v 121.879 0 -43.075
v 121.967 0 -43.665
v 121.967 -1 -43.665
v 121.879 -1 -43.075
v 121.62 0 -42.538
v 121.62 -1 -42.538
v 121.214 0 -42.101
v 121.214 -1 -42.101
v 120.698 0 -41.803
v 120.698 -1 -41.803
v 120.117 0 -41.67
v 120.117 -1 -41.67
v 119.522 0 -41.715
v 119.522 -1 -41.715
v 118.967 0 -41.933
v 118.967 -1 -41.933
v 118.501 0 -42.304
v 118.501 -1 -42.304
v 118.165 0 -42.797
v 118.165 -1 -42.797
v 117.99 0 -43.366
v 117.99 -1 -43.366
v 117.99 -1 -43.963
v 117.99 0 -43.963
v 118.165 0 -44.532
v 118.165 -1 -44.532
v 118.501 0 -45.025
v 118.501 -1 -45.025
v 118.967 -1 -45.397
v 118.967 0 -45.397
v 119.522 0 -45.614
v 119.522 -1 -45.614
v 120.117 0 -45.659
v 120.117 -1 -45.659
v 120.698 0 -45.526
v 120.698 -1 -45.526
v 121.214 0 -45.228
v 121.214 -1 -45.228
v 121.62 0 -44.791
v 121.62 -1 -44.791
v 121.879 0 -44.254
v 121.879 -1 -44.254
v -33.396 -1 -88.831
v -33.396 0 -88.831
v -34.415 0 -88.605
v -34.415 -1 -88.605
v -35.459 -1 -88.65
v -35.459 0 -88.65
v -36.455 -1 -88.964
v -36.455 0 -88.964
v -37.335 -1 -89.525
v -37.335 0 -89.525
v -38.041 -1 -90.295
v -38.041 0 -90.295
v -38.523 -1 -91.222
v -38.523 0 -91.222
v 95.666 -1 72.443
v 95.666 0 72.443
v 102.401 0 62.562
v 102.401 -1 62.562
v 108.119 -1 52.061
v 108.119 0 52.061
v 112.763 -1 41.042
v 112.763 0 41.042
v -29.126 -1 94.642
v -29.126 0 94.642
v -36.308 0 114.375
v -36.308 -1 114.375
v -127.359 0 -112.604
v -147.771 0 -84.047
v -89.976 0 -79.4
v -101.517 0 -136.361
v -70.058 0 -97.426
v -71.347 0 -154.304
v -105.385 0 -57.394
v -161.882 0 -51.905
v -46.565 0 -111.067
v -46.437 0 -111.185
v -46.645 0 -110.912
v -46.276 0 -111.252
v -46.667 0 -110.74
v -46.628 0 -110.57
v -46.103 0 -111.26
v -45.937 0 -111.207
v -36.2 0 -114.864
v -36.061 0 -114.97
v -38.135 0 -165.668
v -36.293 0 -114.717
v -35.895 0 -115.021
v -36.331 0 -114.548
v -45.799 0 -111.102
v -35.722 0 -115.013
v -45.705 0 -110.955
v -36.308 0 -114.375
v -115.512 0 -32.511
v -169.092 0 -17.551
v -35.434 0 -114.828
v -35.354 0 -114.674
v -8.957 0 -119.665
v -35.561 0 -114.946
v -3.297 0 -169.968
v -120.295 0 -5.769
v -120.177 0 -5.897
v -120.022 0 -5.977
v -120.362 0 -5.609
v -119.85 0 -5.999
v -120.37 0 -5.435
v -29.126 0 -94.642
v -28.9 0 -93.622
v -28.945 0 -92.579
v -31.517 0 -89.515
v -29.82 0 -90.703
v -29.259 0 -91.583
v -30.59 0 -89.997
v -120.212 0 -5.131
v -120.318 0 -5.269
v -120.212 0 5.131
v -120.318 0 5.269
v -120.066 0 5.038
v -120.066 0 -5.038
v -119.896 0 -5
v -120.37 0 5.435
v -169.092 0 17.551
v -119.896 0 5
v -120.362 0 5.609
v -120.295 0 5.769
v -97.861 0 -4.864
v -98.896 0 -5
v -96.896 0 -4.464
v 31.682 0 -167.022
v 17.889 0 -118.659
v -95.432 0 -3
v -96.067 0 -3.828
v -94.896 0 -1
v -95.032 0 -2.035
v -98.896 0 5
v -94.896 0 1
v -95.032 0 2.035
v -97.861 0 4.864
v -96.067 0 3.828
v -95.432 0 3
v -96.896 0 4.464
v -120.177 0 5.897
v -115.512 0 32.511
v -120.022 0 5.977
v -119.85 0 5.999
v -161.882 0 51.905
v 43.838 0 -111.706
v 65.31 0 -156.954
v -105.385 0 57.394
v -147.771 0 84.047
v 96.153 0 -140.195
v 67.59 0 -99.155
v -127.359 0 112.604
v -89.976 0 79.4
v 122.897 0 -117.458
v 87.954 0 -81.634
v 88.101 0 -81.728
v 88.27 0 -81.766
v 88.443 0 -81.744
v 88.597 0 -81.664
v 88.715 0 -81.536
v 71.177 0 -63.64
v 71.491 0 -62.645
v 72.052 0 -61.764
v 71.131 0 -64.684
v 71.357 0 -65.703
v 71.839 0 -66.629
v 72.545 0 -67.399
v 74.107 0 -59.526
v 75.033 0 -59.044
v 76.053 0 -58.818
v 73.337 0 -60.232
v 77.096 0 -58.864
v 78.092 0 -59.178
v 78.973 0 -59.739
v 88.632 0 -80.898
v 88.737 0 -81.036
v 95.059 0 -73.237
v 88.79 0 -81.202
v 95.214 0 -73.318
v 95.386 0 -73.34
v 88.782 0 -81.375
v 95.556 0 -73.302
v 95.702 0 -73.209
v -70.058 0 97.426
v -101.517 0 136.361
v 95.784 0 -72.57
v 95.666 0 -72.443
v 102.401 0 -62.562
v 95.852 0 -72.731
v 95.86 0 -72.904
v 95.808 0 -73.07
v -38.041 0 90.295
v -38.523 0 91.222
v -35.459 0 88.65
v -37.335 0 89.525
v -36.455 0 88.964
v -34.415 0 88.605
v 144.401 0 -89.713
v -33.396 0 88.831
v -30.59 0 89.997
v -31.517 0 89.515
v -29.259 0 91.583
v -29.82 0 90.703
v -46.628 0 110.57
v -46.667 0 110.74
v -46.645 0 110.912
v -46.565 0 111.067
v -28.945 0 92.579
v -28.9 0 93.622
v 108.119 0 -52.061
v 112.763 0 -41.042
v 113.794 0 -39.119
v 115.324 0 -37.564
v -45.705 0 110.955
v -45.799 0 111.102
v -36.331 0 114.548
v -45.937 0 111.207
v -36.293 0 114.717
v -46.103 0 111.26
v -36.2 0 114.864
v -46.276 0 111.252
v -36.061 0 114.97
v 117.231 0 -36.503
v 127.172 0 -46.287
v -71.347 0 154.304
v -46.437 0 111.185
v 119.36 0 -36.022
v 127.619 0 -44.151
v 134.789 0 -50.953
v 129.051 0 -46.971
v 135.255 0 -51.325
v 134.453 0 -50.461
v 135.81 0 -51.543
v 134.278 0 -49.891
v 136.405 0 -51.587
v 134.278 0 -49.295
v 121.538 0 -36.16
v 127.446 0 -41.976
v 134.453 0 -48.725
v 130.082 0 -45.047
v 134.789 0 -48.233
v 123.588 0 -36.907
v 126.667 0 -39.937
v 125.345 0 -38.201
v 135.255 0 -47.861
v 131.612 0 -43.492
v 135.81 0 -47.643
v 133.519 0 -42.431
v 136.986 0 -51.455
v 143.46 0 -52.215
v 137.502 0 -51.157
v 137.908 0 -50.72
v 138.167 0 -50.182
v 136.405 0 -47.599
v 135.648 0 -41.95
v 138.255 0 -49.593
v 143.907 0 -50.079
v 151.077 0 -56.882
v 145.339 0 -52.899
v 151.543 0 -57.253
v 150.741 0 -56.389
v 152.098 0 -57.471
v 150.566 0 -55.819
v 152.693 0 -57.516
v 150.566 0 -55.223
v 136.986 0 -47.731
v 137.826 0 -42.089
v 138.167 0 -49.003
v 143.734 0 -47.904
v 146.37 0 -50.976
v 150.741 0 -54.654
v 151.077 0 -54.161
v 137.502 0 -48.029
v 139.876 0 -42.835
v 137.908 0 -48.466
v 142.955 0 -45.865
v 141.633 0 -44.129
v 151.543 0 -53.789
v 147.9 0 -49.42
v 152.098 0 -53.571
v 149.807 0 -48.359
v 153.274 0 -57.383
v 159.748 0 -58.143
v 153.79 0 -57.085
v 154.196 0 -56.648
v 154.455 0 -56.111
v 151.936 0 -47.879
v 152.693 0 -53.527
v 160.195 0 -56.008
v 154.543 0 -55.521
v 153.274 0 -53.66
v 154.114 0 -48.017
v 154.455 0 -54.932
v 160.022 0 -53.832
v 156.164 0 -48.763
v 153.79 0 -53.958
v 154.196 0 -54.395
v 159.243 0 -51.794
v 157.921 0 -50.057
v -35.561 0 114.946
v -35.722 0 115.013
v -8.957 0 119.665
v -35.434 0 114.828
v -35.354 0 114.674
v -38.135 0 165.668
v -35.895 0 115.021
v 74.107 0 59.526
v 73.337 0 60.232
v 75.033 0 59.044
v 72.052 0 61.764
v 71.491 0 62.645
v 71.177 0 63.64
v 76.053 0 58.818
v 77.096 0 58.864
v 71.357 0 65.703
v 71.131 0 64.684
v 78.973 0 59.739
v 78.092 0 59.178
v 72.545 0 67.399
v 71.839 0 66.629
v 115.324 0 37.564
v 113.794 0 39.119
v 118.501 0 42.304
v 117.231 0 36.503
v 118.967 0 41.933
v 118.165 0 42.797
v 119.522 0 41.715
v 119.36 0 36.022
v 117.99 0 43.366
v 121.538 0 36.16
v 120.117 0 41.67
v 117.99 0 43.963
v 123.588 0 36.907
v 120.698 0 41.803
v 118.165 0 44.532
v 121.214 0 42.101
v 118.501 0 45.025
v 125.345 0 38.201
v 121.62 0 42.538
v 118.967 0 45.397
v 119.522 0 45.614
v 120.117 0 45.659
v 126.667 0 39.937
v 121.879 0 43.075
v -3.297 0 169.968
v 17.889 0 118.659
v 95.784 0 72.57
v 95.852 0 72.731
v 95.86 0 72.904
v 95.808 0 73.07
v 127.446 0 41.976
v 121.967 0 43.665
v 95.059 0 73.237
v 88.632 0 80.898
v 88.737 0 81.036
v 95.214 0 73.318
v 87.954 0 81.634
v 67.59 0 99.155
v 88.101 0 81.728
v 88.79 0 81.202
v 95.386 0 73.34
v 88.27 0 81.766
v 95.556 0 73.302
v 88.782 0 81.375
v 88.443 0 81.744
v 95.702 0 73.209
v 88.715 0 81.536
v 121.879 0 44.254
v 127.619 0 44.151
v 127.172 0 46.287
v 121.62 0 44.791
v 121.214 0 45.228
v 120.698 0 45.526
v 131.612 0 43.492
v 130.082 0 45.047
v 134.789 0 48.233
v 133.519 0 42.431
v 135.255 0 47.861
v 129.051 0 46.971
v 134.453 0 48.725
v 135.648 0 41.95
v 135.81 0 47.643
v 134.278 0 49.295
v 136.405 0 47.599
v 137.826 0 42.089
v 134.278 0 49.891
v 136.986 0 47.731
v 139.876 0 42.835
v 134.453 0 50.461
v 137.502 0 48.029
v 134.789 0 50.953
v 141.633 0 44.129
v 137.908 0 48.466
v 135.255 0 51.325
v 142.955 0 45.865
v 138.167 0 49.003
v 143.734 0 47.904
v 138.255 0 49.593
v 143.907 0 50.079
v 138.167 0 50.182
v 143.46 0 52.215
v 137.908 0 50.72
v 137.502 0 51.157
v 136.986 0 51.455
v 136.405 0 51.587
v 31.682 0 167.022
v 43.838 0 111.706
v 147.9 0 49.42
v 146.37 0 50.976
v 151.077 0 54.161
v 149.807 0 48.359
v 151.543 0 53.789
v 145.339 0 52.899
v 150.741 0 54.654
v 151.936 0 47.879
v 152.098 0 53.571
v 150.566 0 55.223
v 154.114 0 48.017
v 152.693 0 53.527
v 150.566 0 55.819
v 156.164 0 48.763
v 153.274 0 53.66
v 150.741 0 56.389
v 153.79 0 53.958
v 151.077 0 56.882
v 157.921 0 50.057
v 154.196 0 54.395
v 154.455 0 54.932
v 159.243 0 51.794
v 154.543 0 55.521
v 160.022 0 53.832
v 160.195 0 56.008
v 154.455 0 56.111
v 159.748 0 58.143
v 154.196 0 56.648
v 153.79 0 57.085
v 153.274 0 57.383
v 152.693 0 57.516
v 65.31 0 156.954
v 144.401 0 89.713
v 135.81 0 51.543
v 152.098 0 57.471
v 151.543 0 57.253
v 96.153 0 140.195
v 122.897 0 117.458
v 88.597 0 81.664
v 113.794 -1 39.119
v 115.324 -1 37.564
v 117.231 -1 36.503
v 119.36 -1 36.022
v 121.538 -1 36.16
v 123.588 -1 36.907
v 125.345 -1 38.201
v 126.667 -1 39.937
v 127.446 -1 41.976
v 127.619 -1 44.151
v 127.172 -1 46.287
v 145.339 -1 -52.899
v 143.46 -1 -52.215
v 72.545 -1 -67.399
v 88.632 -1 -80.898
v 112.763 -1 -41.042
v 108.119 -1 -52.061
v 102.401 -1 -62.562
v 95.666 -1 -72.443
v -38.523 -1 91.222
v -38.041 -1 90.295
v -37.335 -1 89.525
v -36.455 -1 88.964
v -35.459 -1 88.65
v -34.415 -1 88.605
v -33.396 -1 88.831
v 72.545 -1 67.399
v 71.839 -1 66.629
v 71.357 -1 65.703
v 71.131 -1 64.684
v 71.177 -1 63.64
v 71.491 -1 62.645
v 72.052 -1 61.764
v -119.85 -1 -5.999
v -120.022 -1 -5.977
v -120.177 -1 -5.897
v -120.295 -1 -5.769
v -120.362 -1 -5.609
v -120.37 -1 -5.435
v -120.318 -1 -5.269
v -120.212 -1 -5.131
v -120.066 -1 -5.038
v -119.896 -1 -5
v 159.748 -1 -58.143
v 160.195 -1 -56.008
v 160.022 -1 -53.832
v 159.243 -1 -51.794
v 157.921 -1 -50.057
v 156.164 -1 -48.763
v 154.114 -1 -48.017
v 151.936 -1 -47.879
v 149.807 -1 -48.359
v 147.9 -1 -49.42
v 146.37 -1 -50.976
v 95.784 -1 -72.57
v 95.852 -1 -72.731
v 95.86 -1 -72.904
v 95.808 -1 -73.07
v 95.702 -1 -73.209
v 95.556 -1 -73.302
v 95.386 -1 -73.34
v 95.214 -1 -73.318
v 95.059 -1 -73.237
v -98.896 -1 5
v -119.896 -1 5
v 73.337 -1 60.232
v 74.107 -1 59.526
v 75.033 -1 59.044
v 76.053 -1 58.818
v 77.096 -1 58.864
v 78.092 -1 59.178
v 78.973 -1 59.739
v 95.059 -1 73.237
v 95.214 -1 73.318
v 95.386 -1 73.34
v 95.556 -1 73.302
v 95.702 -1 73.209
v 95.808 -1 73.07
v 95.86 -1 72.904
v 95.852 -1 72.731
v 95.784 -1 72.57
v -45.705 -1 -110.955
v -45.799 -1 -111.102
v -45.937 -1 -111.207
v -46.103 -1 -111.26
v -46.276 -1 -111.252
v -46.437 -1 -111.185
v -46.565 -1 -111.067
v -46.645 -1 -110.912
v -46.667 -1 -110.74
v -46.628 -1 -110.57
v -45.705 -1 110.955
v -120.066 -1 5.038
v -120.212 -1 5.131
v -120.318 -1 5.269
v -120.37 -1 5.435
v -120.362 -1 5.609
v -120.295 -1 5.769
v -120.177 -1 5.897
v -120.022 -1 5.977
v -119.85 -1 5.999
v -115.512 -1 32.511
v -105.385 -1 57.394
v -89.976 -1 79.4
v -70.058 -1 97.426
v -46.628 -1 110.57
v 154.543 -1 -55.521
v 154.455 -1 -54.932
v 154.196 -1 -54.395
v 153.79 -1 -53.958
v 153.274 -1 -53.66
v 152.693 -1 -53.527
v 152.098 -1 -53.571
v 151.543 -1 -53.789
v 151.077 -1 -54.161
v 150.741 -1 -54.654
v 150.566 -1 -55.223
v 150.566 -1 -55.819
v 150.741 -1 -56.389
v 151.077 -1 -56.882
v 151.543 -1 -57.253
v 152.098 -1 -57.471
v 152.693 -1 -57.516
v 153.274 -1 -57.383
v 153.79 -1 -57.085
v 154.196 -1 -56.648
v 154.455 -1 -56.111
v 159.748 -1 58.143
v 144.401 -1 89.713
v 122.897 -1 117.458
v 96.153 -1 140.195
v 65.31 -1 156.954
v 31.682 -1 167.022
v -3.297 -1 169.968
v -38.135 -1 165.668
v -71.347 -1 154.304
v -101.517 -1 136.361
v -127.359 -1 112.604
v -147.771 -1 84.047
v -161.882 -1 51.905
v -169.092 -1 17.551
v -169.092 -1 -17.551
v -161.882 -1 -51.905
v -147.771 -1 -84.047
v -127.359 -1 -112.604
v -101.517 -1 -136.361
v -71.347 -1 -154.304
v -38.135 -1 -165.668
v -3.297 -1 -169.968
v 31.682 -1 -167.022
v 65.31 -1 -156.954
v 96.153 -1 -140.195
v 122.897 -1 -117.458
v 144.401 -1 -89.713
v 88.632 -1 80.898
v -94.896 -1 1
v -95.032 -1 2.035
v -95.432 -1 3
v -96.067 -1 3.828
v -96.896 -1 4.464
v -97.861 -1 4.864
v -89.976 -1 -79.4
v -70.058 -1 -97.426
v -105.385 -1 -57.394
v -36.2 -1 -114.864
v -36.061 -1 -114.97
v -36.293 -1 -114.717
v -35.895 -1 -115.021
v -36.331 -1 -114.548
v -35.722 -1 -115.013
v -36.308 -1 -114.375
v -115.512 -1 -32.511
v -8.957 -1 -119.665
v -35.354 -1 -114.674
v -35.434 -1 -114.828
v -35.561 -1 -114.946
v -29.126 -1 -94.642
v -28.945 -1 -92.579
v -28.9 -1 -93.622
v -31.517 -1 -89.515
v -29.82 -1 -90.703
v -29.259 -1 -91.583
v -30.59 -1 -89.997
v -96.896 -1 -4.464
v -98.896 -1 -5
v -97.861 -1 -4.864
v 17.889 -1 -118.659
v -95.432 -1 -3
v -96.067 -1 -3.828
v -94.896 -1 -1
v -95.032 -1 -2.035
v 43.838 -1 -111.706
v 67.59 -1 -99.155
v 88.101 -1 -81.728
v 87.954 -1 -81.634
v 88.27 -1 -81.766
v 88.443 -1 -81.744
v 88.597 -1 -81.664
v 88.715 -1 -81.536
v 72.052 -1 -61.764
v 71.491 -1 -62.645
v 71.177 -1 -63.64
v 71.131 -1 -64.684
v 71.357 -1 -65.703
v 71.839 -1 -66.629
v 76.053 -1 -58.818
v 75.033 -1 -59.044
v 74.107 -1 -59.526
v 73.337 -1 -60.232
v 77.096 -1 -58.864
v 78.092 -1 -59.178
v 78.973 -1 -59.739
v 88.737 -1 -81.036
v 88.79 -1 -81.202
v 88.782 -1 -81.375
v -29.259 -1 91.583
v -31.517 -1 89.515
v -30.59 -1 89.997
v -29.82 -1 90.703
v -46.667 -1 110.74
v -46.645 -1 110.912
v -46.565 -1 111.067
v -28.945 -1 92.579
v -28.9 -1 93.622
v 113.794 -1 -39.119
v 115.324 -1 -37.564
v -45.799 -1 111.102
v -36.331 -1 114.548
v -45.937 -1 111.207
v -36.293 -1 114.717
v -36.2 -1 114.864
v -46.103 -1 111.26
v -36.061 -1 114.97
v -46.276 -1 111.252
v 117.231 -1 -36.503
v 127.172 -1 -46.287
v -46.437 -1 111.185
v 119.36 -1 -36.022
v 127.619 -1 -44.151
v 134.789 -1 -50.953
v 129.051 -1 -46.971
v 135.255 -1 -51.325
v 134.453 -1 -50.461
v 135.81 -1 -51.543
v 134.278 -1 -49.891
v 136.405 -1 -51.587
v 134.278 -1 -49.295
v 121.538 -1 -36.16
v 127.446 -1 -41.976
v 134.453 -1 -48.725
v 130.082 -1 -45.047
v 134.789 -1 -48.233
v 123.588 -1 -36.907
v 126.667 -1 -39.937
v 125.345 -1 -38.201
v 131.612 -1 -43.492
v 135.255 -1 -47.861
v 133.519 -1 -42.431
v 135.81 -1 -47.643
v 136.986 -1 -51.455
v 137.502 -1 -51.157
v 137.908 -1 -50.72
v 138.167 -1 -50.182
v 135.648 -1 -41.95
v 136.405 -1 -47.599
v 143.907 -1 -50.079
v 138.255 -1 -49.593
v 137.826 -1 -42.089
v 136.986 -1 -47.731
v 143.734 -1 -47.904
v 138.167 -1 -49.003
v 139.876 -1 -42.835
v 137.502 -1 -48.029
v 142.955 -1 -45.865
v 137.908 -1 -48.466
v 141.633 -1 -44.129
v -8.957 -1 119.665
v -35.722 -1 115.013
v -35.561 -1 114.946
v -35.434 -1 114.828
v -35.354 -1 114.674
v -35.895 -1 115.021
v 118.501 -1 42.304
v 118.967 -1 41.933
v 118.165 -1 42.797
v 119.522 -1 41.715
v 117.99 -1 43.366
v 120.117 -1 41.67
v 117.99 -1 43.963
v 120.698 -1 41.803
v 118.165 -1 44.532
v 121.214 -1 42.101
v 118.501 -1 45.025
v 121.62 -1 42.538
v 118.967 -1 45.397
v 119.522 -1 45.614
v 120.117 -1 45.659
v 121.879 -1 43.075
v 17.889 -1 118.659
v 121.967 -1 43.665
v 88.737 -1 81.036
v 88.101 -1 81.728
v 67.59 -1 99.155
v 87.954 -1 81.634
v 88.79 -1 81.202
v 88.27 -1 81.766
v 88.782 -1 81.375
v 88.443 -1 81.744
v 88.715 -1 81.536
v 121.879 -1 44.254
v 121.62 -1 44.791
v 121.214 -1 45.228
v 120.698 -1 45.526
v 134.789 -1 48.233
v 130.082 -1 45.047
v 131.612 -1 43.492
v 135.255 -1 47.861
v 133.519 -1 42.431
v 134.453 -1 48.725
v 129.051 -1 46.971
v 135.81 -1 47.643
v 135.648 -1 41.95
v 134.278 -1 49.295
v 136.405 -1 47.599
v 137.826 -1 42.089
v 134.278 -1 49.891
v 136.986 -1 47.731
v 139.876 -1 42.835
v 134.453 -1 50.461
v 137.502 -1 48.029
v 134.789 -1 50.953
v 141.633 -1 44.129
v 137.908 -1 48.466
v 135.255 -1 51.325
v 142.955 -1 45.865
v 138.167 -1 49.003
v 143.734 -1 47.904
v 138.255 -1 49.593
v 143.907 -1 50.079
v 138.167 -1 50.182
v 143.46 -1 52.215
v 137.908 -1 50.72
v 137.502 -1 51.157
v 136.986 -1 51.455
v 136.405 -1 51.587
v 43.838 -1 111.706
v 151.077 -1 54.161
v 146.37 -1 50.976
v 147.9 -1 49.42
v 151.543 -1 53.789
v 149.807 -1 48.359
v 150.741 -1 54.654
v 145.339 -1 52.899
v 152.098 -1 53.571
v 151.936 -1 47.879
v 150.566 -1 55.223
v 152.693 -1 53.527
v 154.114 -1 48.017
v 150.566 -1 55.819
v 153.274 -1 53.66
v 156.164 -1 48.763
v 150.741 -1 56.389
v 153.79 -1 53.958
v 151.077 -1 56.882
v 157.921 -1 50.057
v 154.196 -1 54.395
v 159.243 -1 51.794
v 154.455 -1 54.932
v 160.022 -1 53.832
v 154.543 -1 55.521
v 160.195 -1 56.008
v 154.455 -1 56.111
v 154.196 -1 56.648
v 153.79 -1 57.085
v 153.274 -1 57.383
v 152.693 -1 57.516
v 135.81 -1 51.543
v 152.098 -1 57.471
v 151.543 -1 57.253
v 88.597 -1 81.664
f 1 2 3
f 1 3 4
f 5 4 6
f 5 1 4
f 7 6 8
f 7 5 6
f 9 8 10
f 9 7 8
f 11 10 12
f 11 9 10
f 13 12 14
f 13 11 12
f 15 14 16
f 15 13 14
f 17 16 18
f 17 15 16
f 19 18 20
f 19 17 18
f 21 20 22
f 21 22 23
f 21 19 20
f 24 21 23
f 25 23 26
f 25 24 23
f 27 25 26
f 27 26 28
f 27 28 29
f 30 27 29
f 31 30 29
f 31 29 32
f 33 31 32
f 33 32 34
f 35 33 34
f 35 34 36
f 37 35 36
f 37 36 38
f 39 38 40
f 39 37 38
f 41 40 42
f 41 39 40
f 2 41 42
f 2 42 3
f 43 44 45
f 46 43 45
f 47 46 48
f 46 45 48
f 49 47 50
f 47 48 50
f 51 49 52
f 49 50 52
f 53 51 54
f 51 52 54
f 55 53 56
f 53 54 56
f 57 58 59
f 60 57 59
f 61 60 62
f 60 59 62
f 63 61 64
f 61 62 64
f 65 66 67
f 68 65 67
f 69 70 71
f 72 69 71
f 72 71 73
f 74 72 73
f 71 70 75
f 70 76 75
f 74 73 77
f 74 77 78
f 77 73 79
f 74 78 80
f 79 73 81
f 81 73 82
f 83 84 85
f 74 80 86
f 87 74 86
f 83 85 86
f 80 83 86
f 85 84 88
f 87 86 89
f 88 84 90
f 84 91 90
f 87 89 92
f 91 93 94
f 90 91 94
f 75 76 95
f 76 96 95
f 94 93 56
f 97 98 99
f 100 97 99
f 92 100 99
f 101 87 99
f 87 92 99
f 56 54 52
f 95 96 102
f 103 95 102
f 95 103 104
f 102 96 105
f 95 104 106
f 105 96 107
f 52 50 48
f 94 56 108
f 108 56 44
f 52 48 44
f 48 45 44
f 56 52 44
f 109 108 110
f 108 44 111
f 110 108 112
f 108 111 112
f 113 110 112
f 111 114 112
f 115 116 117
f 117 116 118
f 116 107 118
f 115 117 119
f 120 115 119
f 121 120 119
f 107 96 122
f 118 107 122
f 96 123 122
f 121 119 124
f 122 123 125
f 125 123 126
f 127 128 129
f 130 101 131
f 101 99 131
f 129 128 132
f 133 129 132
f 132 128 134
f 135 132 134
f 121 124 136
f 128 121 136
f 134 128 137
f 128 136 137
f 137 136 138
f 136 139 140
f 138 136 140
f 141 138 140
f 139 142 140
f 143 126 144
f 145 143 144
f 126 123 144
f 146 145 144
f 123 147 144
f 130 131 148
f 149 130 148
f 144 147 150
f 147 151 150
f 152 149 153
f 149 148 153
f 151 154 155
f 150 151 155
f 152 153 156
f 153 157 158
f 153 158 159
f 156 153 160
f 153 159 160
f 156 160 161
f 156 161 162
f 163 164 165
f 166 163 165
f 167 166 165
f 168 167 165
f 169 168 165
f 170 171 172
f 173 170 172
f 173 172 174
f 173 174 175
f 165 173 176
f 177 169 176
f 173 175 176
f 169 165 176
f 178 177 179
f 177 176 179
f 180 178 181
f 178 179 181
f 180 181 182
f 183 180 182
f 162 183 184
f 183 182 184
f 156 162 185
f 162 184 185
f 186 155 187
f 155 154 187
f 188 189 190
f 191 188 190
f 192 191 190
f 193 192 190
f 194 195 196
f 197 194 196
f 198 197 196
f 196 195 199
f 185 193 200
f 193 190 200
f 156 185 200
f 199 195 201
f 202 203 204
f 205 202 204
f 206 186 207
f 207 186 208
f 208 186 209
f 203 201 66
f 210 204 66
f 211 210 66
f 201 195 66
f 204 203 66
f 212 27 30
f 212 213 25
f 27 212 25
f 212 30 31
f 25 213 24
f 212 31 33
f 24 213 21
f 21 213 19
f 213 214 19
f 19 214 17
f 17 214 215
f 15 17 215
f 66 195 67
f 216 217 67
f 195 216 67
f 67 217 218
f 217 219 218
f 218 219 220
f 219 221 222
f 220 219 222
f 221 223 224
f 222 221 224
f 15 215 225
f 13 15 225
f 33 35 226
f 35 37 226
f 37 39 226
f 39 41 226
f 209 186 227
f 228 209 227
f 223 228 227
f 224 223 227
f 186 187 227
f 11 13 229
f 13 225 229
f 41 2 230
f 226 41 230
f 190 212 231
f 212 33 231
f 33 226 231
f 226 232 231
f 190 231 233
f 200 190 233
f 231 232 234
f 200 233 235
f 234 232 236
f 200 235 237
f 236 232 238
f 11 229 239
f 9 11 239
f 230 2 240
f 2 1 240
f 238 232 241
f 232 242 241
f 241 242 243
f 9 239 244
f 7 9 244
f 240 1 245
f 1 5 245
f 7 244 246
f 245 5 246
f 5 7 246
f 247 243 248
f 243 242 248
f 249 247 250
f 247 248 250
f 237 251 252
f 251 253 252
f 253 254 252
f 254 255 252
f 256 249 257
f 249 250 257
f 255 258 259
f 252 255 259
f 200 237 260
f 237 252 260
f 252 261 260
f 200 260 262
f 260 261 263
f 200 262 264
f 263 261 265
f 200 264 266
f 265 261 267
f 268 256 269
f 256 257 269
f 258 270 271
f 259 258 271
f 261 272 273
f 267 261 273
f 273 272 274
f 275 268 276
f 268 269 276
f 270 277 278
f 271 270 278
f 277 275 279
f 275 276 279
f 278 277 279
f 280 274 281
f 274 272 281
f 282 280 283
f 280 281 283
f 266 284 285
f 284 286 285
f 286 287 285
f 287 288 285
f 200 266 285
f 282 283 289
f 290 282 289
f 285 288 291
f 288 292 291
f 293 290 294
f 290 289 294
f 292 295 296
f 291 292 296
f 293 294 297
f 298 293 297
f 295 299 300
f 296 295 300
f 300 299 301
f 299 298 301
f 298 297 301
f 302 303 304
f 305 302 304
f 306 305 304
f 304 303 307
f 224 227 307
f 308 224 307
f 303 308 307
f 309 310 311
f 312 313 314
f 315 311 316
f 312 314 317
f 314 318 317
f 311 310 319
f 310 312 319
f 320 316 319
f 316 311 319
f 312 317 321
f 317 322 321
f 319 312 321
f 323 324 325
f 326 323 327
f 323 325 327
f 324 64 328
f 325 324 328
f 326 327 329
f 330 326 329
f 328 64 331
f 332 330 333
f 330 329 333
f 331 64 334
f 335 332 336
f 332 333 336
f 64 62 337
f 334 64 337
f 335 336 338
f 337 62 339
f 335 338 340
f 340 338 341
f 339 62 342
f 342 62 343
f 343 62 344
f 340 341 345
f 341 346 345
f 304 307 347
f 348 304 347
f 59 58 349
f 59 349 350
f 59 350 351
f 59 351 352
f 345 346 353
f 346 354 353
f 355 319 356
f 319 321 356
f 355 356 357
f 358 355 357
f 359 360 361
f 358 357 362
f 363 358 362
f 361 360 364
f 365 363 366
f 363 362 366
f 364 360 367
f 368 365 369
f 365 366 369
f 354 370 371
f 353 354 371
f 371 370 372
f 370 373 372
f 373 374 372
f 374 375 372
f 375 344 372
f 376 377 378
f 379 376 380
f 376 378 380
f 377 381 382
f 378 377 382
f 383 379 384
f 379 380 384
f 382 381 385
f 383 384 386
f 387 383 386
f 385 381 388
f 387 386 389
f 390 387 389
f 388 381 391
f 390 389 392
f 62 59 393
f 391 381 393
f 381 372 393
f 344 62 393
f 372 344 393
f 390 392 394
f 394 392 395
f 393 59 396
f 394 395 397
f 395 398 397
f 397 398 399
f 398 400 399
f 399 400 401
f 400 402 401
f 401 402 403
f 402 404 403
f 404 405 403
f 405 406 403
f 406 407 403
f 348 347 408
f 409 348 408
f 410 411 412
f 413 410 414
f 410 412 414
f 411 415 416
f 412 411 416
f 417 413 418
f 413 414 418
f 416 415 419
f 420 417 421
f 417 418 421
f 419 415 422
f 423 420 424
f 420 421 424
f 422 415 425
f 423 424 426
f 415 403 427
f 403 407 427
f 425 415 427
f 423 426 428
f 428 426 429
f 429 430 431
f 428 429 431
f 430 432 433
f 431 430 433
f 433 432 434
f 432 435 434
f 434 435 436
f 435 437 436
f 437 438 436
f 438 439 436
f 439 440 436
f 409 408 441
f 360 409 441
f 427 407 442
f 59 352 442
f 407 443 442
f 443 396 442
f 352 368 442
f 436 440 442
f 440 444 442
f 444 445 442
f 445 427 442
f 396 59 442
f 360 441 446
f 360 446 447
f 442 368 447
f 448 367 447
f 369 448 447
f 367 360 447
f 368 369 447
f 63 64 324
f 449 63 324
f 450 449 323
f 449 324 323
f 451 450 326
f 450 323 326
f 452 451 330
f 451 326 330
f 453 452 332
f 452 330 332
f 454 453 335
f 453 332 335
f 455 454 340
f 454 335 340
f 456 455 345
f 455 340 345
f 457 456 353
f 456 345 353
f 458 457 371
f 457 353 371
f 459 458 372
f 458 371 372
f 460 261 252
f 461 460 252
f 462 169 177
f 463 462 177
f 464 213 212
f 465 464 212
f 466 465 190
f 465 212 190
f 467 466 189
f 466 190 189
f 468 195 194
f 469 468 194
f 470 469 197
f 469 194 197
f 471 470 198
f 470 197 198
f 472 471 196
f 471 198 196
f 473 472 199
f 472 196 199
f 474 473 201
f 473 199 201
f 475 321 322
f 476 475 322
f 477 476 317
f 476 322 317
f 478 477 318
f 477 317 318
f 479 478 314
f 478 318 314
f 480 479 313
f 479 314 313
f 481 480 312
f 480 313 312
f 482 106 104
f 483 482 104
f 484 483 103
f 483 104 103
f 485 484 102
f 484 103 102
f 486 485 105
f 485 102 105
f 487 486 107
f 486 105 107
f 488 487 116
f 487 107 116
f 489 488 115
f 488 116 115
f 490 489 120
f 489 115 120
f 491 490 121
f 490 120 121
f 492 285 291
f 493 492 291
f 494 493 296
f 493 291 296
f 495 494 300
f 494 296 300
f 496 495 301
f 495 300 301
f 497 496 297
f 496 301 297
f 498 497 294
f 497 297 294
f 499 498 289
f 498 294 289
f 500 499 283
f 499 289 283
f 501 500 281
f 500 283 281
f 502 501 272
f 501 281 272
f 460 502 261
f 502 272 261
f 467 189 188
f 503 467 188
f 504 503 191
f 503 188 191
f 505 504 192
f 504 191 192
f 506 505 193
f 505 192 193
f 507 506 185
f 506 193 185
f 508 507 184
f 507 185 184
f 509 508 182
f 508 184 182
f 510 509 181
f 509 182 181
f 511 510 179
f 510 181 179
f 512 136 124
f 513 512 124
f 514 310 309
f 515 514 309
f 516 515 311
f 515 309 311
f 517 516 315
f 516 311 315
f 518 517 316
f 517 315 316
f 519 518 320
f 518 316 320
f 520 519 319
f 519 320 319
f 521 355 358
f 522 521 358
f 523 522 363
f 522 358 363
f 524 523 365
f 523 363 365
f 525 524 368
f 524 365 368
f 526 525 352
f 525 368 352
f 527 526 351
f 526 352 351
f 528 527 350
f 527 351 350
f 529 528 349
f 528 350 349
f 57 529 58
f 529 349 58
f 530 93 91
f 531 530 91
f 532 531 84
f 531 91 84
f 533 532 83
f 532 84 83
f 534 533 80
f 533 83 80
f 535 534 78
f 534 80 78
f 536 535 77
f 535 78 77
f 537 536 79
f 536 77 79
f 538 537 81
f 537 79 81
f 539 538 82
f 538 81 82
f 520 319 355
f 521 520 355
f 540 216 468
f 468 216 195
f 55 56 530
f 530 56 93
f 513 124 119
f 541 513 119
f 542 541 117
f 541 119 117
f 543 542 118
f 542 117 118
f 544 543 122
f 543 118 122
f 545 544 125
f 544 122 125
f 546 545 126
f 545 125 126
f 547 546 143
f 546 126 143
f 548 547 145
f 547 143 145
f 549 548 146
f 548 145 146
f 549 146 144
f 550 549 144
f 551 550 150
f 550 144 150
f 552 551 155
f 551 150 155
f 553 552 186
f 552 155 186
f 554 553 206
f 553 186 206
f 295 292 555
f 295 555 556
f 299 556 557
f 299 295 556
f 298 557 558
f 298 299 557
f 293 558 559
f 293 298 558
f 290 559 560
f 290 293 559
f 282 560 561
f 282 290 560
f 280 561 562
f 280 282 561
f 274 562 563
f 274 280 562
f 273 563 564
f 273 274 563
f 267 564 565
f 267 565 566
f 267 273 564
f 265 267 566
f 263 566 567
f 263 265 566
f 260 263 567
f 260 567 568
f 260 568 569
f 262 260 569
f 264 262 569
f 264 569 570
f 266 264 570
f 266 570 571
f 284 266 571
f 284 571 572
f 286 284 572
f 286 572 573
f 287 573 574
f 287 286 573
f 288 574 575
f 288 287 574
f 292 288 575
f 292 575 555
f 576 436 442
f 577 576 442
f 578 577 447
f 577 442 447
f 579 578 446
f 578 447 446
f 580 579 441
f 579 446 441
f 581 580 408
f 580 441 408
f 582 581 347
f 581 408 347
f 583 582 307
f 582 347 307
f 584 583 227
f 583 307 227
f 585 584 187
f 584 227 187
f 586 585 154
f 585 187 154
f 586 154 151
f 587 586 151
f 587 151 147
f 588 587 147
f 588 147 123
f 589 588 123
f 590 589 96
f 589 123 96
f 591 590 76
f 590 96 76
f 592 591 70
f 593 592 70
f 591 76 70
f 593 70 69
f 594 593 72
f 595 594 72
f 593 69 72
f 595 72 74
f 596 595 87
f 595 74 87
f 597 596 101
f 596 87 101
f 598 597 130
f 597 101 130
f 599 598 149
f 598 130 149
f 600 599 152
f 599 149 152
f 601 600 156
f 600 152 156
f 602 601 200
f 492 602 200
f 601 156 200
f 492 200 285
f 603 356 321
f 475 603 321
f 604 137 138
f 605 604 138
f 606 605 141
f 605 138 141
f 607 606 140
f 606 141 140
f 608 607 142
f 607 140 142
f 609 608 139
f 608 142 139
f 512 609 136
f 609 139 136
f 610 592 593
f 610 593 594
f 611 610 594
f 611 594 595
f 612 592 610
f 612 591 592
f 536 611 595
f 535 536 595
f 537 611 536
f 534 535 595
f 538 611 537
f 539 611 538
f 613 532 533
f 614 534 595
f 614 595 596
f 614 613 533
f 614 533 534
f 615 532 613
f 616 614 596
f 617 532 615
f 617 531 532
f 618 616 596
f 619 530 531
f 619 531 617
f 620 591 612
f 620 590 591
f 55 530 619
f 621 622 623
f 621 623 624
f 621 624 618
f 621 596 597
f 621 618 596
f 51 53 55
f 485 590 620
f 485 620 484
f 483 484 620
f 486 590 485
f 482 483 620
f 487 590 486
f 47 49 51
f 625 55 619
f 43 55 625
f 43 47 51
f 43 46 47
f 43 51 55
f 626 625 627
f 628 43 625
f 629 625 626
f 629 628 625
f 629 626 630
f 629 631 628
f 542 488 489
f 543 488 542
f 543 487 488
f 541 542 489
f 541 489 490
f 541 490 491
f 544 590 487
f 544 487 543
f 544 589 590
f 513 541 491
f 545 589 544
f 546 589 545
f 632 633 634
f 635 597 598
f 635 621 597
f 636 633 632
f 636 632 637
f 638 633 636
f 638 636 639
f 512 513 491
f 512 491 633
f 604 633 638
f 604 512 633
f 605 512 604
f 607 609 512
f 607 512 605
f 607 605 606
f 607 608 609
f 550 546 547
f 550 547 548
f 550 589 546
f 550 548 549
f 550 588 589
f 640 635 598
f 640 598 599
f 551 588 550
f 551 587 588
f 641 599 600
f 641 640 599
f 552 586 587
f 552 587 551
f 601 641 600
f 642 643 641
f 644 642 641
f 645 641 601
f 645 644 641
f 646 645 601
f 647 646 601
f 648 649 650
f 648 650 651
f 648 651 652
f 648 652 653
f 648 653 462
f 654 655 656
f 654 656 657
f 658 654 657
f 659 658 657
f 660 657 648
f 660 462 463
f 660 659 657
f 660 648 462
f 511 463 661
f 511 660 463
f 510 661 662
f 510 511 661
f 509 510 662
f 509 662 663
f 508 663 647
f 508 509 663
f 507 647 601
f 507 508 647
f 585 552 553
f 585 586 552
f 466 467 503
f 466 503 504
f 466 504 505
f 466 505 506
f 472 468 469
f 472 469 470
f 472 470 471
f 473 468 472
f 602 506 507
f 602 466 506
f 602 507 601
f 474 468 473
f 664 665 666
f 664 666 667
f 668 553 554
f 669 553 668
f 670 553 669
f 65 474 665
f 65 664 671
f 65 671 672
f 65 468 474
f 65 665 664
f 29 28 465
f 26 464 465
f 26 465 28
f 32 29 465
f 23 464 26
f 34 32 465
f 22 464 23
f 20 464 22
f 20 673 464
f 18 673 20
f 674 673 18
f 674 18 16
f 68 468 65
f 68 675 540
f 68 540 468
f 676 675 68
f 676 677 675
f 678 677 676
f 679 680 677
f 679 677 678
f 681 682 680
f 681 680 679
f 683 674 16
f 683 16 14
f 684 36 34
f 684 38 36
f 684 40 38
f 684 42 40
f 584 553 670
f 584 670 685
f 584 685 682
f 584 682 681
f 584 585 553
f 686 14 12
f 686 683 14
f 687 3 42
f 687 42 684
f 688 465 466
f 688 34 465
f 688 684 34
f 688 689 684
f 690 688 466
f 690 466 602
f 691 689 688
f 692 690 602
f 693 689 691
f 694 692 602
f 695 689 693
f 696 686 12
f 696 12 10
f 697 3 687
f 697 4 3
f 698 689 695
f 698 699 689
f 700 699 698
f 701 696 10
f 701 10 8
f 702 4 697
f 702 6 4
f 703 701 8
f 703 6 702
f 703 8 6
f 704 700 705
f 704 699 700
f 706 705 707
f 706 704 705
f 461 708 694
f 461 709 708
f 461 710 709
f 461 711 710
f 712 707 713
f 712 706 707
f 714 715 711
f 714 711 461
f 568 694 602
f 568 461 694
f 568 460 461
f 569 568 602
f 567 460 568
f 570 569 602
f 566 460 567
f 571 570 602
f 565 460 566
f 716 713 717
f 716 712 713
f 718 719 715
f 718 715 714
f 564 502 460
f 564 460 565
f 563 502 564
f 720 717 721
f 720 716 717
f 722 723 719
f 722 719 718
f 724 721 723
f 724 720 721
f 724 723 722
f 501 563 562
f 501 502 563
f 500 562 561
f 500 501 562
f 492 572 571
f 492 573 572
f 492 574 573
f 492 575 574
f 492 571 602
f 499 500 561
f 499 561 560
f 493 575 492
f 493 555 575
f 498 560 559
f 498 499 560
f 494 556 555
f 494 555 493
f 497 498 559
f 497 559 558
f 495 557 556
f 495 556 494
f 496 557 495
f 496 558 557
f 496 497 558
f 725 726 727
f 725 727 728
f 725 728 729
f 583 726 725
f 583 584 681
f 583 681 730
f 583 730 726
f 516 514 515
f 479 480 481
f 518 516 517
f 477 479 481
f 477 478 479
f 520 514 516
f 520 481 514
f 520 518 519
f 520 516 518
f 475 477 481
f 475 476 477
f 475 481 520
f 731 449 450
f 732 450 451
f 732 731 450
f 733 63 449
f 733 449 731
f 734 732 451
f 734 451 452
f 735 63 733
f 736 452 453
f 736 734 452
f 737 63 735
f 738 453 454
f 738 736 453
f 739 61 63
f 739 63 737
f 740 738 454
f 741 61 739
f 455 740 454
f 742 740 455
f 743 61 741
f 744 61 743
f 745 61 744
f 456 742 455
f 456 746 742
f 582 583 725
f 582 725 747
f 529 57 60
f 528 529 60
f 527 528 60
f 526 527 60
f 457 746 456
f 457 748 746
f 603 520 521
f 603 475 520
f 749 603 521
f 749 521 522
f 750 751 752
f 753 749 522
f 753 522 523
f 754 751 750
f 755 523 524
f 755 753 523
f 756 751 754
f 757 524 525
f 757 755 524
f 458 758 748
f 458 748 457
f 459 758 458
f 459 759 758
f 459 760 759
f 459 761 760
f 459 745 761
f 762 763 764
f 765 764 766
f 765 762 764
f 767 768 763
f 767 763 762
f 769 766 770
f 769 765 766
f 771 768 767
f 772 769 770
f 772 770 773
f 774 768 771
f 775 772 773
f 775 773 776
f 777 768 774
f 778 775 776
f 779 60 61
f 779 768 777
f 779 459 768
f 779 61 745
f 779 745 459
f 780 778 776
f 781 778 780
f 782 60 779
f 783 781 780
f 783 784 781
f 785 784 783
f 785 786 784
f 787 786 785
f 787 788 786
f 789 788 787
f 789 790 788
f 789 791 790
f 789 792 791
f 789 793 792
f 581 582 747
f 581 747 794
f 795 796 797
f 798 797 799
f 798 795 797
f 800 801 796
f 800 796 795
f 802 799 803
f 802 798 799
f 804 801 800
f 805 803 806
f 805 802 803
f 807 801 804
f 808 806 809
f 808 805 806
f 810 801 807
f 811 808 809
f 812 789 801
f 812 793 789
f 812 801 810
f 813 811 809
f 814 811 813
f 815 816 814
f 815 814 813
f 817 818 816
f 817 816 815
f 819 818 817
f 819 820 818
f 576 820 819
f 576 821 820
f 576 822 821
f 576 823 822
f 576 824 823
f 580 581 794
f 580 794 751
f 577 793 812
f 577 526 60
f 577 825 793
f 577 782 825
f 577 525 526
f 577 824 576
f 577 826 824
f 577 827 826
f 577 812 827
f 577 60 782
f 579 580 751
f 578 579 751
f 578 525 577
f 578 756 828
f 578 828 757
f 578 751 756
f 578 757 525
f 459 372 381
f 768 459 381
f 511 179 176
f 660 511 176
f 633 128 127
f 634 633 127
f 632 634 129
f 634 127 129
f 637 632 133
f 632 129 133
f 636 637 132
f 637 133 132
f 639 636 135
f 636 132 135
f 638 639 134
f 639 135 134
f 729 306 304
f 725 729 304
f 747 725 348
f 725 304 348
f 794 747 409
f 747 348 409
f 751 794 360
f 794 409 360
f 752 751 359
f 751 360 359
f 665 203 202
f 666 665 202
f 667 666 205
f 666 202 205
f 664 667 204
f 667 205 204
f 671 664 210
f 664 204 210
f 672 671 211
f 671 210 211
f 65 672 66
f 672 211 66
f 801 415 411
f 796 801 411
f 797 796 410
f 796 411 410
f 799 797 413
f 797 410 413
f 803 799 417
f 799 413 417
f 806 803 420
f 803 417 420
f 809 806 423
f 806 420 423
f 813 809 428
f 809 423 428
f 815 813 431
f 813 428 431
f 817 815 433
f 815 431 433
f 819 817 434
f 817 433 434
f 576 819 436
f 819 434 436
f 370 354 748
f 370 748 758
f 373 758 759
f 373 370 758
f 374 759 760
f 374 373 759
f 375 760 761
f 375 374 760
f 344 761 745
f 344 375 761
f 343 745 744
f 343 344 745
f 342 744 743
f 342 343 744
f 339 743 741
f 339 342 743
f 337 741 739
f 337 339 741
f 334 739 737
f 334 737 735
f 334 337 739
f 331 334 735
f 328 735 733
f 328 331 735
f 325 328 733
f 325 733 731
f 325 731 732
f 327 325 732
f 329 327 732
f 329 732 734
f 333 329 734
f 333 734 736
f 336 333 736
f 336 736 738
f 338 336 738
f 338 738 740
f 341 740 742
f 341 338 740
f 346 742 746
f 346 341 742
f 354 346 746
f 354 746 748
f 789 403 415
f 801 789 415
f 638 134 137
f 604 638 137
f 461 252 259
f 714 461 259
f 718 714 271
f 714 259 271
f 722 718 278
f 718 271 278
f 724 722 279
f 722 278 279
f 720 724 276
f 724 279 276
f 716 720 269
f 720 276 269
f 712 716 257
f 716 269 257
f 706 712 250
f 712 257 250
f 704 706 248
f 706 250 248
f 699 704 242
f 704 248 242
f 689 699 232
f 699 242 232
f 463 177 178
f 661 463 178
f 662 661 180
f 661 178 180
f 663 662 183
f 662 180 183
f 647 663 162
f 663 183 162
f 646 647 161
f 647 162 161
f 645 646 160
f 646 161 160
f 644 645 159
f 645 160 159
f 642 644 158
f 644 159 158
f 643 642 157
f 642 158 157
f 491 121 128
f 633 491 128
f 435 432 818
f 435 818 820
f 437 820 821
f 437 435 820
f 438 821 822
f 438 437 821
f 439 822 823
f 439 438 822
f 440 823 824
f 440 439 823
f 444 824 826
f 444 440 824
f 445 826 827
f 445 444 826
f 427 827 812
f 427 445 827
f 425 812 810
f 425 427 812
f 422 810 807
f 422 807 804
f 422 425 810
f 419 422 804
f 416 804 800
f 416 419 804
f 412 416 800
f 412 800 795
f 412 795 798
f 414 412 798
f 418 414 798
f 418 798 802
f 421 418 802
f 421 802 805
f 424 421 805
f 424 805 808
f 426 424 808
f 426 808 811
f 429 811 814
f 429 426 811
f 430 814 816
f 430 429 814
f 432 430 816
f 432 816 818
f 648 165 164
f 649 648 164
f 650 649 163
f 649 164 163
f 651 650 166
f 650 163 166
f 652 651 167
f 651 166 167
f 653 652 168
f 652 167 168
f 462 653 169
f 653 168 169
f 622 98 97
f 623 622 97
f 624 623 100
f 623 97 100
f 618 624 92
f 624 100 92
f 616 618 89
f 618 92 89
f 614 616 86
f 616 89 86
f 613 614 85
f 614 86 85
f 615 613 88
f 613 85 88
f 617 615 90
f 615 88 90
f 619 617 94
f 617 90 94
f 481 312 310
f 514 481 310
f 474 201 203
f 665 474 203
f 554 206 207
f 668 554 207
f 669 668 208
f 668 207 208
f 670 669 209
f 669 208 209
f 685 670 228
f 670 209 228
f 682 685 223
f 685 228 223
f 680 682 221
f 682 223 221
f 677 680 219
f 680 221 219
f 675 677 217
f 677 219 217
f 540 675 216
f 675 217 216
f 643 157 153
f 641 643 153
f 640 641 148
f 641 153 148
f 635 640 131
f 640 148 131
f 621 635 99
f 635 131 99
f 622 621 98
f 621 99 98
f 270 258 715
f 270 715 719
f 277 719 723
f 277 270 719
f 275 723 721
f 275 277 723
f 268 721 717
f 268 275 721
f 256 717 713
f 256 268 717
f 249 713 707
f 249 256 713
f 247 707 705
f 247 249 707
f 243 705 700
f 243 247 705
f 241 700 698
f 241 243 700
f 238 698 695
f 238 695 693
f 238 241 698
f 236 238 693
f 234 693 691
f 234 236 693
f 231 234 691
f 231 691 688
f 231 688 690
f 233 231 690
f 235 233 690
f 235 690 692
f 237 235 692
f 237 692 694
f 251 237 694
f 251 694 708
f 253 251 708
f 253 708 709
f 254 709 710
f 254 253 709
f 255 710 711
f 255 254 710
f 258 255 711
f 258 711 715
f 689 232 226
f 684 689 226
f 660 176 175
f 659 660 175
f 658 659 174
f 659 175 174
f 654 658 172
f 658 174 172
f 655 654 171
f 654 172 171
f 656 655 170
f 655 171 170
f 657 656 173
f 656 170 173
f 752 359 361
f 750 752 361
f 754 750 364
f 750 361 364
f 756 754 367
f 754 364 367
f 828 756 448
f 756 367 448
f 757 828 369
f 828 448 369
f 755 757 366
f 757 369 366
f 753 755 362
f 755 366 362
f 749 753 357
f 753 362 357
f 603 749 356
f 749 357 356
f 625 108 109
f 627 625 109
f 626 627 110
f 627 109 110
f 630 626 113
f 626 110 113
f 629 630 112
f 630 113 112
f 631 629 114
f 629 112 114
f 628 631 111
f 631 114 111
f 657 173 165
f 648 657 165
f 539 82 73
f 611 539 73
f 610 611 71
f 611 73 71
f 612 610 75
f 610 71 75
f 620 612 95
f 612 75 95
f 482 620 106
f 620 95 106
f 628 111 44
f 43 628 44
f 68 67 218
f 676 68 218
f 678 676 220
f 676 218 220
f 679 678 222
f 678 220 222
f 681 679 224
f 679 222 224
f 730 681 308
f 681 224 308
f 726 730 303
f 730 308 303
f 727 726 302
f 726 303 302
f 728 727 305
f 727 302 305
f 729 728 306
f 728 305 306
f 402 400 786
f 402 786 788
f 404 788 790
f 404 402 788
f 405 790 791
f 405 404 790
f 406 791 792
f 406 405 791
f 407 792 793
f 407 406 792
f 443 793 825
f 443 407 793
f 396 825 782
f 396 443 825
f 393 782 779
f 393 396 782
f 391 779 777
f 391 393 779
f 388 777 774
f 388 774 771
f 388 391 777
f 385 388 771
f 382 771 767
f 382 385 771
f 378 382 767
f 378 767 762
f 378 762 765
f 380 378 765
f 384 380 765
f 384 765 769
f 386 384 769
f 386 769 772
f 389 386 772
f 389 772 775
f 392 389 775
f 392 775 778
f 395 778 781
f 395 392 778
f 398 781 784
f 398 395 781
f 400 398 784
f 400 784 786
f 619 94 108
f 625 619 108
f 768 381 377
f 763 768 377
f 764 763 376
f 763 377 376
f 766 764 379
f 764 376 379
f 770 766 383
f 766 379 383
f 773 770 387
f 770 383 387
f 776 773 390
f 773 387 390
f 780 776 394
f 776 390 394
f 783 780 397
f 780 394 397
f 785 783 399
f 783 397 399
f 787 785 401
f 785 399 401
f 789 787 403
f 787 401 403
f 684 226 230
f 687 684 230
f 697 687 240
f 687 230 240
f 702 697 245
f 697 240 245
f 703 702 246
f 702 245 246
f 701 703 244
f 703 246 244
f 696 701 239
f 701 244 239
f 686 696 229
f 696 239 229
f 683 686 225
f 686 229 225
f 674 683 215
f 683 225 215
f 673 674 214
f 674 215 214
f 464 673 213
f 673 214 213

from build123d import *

# Parameters (mm, degrees)
F0_R     = 2
F1_DEPTH = 1


with BuildPart() as f1:
    # F0 (on Front) → F1 (new body)
    with BuildSketch(Plane.XZ):
        with BuildLine():
            ThreePointArc((95.666444, 72.442608), (105.390764, 57.382809), (112.763114, 41.042417))
            ThreePointArc((112.763114, 41.042417), (122.589579, 36.460262), (127.171735, 46.286726))
            Line((127.171735, 46.286726), (129.05112, 46.970766))
            ThreePointArc((129.05112, 46.970766), (138.877584, 42.388611), (143.45974, 52.215075))
            Line((143.45974, 52.215075), (145.339125, 52.899116))
            ThreePointArc((145.339125, 52.899116), (155.16559, 48.31696), (159.747746, 58.143424))
            ThreePointArc((159.747746, 58.143424), (-170, 0), (159.747746, -58.143424))
            ThreePointArc((159.747746, -58.143424), (155.16559, -48.31696), (145.339125, -52.899116))
            Line((145.339125, -52.899116), (143.45974, -52.215075))
            ThreePointArc((143.45974, -52.215075), (138.877584, -42.388611), (129.05112, -46.970766))
            Line((129.05112, -46.970766), (127.171735, -46.286726))
            ThreePointArc((127.171735, -46.286726), (122.589579, -36.460262), (112.763114, -41.042417))
            ThreePointArc((112.763114, -41.042417), (105.390764, -57.382809), (95.666444, -72.442608))
            ThreePointArc((95.666444, -72.442608), (95.761119, -73.144091), (95.05944, -73.237305))
            Line((95.05944, -73.237305), (78.972507, -59.738765))
            ThreePointArc((78.972507, -59.738765), (76.052734, -58.818164), (73.337179, -60.231792))
            Line((73.337179, -60.231792), (72.051604, -61.763881))
            ThreePointArc((72.051604, -61.763881), (71.131003, -64.683655), (72.544631, -67.399209))
            Line((72.544631, -67.399209), (88.631564, -80.897749))
            ThreePointArc((88.631564, -80.897749), (88.661612, -81.604954), (87.954346, -81.633529))
            ThreePointArc((87.954346, -81.633529), (31.058285, -115.911099), (-35.353934, -114.673883))
            ThreePointArc((-35.353934, -114.673883), (-35.980731, -115.002769), (-36.308312, -114.375288))
            Line((-36.308312, -114.375288), (-29.125889, -94.641743))
            ThreePointArc((-29.125889, -94.641743), (-29.259428, -91.583189), (-31.516578, -89.514892))
            Line((-31.516578, -89.514892), (-33.395964, -88.830852))
            ThreePointArc((-33.395964, -88.830852), (-36.454517, -88.964391), (-38.522815, -91.221542))
            Line((-38.522815, -91.221542), (-45.705238, -110.955087))
            ThreePointArc((-45.705238, -110.955087), (-46.359516, -111.225201), (-46.628266, -110.570361))
            ThreePointArc((-46.628266, -110.570361), (-98.298245, -68.829172), (-119.849959, -5.998947))
            ThreePointArc((-119.849959, -5.998947), (-120.373389, -5.522436), (-119.895788, -5))
            Line((-119.895788, -5), (-98.895788, -5))
            ThreePointArc((-98.895788, -5), (-96.067361, -3.828427), (-94.895788, -1))
            Line((-94.895788, -1), (-94.895788, 1))
            ThreePointArc((-94.895788, 1), (-96.067361, 3.828427), (-98.895788, 5))
            Line((-98.895788, 5), (-119.895788, 5))
            ThreePointArc((-119.895788, 5), (-120.373389, 5.522436), (-119.849959, 5.998947))
            ThreePointArc((-119.849959, 5.998947), (-98.298245, 68.829172), (-46.628266, 110.570361))
            ThreePointArc((-46.628266, 110.570361), (-46.359516, 111.225201), (-45.705238, 110.955087))
            Line((-45.705238, 110.955087), (-38.522815, 91.221542))
            ThreePointArc((-38.522815, 91.221542), (-36.454517, 88.964391), (-33.395964, 88.830852))
            Line((-33.395964, 88.830852), (-31.516578, 89.514892))
            ThreePointArc((-31.516578, 89.514892), (-29.259428, 91.583189), (-29.125889, 94.641743))
            Line((-29.125889, 94.641743), (-36.308312, 114.375288))
            ThreePointArc((-36.308312, 114.375288), (-35.980731, 115.002769), (-35.353934, 114.673883))
            ThreePointArc((-35.353934, 114.673883), (31.058285, 115.911099), (87.954346, 81.633529))
            ThreePointArc((87.954346, 81.633529), (88.661612, 81.604954), (88.631564, 80.897749))
            Line((88.631564, 80.897749), (72.544631, 67.399209))
            ThreePointArc((72.544631, 67.399209), (71.131003, 64.683655), (72.051604, 61.763881))
            Line((72.051604, 61.763881), (73.337179, 60.231792))
            ThreePointArc((73.337179, 60.231792), (76.052734, 58.818164), (78.972507, 59.738765))
            Line((78.972507, 59.738765), (95.05944, 73.237305))
            ThreePointArc((95.05944, 73.237305), (95.761119, 73.144091), (95.666444, 72.442608))
        make_face()
        with Locations((119.967425, -43.664572)):
            Circle(F0_R, mode=Mode.SUBTRACT)
        with Locations((136.25543, -49.592921)):
            Circle(F0_R, mode=Mode.SUBTRACT)
        with Locations((152.543435, -55.52127)):
            Circle(F0_R, mode=Mode.SUBTRACT)
        with Locations((119.967425, 43.664572)):
            Circle(F0_R, mode=Mode.SUBTRACT)
        with Locations((136.25543, 49.592921)):
            Circle(F0_R, mode=Mode.SUBTRACT)
        with Locations((152.543435, 55.52127)):
            Circle(F0_R, mode=Mode.SUBTRACT)
    extrude(amount=F1_DEPTH)


solid = f1.part
